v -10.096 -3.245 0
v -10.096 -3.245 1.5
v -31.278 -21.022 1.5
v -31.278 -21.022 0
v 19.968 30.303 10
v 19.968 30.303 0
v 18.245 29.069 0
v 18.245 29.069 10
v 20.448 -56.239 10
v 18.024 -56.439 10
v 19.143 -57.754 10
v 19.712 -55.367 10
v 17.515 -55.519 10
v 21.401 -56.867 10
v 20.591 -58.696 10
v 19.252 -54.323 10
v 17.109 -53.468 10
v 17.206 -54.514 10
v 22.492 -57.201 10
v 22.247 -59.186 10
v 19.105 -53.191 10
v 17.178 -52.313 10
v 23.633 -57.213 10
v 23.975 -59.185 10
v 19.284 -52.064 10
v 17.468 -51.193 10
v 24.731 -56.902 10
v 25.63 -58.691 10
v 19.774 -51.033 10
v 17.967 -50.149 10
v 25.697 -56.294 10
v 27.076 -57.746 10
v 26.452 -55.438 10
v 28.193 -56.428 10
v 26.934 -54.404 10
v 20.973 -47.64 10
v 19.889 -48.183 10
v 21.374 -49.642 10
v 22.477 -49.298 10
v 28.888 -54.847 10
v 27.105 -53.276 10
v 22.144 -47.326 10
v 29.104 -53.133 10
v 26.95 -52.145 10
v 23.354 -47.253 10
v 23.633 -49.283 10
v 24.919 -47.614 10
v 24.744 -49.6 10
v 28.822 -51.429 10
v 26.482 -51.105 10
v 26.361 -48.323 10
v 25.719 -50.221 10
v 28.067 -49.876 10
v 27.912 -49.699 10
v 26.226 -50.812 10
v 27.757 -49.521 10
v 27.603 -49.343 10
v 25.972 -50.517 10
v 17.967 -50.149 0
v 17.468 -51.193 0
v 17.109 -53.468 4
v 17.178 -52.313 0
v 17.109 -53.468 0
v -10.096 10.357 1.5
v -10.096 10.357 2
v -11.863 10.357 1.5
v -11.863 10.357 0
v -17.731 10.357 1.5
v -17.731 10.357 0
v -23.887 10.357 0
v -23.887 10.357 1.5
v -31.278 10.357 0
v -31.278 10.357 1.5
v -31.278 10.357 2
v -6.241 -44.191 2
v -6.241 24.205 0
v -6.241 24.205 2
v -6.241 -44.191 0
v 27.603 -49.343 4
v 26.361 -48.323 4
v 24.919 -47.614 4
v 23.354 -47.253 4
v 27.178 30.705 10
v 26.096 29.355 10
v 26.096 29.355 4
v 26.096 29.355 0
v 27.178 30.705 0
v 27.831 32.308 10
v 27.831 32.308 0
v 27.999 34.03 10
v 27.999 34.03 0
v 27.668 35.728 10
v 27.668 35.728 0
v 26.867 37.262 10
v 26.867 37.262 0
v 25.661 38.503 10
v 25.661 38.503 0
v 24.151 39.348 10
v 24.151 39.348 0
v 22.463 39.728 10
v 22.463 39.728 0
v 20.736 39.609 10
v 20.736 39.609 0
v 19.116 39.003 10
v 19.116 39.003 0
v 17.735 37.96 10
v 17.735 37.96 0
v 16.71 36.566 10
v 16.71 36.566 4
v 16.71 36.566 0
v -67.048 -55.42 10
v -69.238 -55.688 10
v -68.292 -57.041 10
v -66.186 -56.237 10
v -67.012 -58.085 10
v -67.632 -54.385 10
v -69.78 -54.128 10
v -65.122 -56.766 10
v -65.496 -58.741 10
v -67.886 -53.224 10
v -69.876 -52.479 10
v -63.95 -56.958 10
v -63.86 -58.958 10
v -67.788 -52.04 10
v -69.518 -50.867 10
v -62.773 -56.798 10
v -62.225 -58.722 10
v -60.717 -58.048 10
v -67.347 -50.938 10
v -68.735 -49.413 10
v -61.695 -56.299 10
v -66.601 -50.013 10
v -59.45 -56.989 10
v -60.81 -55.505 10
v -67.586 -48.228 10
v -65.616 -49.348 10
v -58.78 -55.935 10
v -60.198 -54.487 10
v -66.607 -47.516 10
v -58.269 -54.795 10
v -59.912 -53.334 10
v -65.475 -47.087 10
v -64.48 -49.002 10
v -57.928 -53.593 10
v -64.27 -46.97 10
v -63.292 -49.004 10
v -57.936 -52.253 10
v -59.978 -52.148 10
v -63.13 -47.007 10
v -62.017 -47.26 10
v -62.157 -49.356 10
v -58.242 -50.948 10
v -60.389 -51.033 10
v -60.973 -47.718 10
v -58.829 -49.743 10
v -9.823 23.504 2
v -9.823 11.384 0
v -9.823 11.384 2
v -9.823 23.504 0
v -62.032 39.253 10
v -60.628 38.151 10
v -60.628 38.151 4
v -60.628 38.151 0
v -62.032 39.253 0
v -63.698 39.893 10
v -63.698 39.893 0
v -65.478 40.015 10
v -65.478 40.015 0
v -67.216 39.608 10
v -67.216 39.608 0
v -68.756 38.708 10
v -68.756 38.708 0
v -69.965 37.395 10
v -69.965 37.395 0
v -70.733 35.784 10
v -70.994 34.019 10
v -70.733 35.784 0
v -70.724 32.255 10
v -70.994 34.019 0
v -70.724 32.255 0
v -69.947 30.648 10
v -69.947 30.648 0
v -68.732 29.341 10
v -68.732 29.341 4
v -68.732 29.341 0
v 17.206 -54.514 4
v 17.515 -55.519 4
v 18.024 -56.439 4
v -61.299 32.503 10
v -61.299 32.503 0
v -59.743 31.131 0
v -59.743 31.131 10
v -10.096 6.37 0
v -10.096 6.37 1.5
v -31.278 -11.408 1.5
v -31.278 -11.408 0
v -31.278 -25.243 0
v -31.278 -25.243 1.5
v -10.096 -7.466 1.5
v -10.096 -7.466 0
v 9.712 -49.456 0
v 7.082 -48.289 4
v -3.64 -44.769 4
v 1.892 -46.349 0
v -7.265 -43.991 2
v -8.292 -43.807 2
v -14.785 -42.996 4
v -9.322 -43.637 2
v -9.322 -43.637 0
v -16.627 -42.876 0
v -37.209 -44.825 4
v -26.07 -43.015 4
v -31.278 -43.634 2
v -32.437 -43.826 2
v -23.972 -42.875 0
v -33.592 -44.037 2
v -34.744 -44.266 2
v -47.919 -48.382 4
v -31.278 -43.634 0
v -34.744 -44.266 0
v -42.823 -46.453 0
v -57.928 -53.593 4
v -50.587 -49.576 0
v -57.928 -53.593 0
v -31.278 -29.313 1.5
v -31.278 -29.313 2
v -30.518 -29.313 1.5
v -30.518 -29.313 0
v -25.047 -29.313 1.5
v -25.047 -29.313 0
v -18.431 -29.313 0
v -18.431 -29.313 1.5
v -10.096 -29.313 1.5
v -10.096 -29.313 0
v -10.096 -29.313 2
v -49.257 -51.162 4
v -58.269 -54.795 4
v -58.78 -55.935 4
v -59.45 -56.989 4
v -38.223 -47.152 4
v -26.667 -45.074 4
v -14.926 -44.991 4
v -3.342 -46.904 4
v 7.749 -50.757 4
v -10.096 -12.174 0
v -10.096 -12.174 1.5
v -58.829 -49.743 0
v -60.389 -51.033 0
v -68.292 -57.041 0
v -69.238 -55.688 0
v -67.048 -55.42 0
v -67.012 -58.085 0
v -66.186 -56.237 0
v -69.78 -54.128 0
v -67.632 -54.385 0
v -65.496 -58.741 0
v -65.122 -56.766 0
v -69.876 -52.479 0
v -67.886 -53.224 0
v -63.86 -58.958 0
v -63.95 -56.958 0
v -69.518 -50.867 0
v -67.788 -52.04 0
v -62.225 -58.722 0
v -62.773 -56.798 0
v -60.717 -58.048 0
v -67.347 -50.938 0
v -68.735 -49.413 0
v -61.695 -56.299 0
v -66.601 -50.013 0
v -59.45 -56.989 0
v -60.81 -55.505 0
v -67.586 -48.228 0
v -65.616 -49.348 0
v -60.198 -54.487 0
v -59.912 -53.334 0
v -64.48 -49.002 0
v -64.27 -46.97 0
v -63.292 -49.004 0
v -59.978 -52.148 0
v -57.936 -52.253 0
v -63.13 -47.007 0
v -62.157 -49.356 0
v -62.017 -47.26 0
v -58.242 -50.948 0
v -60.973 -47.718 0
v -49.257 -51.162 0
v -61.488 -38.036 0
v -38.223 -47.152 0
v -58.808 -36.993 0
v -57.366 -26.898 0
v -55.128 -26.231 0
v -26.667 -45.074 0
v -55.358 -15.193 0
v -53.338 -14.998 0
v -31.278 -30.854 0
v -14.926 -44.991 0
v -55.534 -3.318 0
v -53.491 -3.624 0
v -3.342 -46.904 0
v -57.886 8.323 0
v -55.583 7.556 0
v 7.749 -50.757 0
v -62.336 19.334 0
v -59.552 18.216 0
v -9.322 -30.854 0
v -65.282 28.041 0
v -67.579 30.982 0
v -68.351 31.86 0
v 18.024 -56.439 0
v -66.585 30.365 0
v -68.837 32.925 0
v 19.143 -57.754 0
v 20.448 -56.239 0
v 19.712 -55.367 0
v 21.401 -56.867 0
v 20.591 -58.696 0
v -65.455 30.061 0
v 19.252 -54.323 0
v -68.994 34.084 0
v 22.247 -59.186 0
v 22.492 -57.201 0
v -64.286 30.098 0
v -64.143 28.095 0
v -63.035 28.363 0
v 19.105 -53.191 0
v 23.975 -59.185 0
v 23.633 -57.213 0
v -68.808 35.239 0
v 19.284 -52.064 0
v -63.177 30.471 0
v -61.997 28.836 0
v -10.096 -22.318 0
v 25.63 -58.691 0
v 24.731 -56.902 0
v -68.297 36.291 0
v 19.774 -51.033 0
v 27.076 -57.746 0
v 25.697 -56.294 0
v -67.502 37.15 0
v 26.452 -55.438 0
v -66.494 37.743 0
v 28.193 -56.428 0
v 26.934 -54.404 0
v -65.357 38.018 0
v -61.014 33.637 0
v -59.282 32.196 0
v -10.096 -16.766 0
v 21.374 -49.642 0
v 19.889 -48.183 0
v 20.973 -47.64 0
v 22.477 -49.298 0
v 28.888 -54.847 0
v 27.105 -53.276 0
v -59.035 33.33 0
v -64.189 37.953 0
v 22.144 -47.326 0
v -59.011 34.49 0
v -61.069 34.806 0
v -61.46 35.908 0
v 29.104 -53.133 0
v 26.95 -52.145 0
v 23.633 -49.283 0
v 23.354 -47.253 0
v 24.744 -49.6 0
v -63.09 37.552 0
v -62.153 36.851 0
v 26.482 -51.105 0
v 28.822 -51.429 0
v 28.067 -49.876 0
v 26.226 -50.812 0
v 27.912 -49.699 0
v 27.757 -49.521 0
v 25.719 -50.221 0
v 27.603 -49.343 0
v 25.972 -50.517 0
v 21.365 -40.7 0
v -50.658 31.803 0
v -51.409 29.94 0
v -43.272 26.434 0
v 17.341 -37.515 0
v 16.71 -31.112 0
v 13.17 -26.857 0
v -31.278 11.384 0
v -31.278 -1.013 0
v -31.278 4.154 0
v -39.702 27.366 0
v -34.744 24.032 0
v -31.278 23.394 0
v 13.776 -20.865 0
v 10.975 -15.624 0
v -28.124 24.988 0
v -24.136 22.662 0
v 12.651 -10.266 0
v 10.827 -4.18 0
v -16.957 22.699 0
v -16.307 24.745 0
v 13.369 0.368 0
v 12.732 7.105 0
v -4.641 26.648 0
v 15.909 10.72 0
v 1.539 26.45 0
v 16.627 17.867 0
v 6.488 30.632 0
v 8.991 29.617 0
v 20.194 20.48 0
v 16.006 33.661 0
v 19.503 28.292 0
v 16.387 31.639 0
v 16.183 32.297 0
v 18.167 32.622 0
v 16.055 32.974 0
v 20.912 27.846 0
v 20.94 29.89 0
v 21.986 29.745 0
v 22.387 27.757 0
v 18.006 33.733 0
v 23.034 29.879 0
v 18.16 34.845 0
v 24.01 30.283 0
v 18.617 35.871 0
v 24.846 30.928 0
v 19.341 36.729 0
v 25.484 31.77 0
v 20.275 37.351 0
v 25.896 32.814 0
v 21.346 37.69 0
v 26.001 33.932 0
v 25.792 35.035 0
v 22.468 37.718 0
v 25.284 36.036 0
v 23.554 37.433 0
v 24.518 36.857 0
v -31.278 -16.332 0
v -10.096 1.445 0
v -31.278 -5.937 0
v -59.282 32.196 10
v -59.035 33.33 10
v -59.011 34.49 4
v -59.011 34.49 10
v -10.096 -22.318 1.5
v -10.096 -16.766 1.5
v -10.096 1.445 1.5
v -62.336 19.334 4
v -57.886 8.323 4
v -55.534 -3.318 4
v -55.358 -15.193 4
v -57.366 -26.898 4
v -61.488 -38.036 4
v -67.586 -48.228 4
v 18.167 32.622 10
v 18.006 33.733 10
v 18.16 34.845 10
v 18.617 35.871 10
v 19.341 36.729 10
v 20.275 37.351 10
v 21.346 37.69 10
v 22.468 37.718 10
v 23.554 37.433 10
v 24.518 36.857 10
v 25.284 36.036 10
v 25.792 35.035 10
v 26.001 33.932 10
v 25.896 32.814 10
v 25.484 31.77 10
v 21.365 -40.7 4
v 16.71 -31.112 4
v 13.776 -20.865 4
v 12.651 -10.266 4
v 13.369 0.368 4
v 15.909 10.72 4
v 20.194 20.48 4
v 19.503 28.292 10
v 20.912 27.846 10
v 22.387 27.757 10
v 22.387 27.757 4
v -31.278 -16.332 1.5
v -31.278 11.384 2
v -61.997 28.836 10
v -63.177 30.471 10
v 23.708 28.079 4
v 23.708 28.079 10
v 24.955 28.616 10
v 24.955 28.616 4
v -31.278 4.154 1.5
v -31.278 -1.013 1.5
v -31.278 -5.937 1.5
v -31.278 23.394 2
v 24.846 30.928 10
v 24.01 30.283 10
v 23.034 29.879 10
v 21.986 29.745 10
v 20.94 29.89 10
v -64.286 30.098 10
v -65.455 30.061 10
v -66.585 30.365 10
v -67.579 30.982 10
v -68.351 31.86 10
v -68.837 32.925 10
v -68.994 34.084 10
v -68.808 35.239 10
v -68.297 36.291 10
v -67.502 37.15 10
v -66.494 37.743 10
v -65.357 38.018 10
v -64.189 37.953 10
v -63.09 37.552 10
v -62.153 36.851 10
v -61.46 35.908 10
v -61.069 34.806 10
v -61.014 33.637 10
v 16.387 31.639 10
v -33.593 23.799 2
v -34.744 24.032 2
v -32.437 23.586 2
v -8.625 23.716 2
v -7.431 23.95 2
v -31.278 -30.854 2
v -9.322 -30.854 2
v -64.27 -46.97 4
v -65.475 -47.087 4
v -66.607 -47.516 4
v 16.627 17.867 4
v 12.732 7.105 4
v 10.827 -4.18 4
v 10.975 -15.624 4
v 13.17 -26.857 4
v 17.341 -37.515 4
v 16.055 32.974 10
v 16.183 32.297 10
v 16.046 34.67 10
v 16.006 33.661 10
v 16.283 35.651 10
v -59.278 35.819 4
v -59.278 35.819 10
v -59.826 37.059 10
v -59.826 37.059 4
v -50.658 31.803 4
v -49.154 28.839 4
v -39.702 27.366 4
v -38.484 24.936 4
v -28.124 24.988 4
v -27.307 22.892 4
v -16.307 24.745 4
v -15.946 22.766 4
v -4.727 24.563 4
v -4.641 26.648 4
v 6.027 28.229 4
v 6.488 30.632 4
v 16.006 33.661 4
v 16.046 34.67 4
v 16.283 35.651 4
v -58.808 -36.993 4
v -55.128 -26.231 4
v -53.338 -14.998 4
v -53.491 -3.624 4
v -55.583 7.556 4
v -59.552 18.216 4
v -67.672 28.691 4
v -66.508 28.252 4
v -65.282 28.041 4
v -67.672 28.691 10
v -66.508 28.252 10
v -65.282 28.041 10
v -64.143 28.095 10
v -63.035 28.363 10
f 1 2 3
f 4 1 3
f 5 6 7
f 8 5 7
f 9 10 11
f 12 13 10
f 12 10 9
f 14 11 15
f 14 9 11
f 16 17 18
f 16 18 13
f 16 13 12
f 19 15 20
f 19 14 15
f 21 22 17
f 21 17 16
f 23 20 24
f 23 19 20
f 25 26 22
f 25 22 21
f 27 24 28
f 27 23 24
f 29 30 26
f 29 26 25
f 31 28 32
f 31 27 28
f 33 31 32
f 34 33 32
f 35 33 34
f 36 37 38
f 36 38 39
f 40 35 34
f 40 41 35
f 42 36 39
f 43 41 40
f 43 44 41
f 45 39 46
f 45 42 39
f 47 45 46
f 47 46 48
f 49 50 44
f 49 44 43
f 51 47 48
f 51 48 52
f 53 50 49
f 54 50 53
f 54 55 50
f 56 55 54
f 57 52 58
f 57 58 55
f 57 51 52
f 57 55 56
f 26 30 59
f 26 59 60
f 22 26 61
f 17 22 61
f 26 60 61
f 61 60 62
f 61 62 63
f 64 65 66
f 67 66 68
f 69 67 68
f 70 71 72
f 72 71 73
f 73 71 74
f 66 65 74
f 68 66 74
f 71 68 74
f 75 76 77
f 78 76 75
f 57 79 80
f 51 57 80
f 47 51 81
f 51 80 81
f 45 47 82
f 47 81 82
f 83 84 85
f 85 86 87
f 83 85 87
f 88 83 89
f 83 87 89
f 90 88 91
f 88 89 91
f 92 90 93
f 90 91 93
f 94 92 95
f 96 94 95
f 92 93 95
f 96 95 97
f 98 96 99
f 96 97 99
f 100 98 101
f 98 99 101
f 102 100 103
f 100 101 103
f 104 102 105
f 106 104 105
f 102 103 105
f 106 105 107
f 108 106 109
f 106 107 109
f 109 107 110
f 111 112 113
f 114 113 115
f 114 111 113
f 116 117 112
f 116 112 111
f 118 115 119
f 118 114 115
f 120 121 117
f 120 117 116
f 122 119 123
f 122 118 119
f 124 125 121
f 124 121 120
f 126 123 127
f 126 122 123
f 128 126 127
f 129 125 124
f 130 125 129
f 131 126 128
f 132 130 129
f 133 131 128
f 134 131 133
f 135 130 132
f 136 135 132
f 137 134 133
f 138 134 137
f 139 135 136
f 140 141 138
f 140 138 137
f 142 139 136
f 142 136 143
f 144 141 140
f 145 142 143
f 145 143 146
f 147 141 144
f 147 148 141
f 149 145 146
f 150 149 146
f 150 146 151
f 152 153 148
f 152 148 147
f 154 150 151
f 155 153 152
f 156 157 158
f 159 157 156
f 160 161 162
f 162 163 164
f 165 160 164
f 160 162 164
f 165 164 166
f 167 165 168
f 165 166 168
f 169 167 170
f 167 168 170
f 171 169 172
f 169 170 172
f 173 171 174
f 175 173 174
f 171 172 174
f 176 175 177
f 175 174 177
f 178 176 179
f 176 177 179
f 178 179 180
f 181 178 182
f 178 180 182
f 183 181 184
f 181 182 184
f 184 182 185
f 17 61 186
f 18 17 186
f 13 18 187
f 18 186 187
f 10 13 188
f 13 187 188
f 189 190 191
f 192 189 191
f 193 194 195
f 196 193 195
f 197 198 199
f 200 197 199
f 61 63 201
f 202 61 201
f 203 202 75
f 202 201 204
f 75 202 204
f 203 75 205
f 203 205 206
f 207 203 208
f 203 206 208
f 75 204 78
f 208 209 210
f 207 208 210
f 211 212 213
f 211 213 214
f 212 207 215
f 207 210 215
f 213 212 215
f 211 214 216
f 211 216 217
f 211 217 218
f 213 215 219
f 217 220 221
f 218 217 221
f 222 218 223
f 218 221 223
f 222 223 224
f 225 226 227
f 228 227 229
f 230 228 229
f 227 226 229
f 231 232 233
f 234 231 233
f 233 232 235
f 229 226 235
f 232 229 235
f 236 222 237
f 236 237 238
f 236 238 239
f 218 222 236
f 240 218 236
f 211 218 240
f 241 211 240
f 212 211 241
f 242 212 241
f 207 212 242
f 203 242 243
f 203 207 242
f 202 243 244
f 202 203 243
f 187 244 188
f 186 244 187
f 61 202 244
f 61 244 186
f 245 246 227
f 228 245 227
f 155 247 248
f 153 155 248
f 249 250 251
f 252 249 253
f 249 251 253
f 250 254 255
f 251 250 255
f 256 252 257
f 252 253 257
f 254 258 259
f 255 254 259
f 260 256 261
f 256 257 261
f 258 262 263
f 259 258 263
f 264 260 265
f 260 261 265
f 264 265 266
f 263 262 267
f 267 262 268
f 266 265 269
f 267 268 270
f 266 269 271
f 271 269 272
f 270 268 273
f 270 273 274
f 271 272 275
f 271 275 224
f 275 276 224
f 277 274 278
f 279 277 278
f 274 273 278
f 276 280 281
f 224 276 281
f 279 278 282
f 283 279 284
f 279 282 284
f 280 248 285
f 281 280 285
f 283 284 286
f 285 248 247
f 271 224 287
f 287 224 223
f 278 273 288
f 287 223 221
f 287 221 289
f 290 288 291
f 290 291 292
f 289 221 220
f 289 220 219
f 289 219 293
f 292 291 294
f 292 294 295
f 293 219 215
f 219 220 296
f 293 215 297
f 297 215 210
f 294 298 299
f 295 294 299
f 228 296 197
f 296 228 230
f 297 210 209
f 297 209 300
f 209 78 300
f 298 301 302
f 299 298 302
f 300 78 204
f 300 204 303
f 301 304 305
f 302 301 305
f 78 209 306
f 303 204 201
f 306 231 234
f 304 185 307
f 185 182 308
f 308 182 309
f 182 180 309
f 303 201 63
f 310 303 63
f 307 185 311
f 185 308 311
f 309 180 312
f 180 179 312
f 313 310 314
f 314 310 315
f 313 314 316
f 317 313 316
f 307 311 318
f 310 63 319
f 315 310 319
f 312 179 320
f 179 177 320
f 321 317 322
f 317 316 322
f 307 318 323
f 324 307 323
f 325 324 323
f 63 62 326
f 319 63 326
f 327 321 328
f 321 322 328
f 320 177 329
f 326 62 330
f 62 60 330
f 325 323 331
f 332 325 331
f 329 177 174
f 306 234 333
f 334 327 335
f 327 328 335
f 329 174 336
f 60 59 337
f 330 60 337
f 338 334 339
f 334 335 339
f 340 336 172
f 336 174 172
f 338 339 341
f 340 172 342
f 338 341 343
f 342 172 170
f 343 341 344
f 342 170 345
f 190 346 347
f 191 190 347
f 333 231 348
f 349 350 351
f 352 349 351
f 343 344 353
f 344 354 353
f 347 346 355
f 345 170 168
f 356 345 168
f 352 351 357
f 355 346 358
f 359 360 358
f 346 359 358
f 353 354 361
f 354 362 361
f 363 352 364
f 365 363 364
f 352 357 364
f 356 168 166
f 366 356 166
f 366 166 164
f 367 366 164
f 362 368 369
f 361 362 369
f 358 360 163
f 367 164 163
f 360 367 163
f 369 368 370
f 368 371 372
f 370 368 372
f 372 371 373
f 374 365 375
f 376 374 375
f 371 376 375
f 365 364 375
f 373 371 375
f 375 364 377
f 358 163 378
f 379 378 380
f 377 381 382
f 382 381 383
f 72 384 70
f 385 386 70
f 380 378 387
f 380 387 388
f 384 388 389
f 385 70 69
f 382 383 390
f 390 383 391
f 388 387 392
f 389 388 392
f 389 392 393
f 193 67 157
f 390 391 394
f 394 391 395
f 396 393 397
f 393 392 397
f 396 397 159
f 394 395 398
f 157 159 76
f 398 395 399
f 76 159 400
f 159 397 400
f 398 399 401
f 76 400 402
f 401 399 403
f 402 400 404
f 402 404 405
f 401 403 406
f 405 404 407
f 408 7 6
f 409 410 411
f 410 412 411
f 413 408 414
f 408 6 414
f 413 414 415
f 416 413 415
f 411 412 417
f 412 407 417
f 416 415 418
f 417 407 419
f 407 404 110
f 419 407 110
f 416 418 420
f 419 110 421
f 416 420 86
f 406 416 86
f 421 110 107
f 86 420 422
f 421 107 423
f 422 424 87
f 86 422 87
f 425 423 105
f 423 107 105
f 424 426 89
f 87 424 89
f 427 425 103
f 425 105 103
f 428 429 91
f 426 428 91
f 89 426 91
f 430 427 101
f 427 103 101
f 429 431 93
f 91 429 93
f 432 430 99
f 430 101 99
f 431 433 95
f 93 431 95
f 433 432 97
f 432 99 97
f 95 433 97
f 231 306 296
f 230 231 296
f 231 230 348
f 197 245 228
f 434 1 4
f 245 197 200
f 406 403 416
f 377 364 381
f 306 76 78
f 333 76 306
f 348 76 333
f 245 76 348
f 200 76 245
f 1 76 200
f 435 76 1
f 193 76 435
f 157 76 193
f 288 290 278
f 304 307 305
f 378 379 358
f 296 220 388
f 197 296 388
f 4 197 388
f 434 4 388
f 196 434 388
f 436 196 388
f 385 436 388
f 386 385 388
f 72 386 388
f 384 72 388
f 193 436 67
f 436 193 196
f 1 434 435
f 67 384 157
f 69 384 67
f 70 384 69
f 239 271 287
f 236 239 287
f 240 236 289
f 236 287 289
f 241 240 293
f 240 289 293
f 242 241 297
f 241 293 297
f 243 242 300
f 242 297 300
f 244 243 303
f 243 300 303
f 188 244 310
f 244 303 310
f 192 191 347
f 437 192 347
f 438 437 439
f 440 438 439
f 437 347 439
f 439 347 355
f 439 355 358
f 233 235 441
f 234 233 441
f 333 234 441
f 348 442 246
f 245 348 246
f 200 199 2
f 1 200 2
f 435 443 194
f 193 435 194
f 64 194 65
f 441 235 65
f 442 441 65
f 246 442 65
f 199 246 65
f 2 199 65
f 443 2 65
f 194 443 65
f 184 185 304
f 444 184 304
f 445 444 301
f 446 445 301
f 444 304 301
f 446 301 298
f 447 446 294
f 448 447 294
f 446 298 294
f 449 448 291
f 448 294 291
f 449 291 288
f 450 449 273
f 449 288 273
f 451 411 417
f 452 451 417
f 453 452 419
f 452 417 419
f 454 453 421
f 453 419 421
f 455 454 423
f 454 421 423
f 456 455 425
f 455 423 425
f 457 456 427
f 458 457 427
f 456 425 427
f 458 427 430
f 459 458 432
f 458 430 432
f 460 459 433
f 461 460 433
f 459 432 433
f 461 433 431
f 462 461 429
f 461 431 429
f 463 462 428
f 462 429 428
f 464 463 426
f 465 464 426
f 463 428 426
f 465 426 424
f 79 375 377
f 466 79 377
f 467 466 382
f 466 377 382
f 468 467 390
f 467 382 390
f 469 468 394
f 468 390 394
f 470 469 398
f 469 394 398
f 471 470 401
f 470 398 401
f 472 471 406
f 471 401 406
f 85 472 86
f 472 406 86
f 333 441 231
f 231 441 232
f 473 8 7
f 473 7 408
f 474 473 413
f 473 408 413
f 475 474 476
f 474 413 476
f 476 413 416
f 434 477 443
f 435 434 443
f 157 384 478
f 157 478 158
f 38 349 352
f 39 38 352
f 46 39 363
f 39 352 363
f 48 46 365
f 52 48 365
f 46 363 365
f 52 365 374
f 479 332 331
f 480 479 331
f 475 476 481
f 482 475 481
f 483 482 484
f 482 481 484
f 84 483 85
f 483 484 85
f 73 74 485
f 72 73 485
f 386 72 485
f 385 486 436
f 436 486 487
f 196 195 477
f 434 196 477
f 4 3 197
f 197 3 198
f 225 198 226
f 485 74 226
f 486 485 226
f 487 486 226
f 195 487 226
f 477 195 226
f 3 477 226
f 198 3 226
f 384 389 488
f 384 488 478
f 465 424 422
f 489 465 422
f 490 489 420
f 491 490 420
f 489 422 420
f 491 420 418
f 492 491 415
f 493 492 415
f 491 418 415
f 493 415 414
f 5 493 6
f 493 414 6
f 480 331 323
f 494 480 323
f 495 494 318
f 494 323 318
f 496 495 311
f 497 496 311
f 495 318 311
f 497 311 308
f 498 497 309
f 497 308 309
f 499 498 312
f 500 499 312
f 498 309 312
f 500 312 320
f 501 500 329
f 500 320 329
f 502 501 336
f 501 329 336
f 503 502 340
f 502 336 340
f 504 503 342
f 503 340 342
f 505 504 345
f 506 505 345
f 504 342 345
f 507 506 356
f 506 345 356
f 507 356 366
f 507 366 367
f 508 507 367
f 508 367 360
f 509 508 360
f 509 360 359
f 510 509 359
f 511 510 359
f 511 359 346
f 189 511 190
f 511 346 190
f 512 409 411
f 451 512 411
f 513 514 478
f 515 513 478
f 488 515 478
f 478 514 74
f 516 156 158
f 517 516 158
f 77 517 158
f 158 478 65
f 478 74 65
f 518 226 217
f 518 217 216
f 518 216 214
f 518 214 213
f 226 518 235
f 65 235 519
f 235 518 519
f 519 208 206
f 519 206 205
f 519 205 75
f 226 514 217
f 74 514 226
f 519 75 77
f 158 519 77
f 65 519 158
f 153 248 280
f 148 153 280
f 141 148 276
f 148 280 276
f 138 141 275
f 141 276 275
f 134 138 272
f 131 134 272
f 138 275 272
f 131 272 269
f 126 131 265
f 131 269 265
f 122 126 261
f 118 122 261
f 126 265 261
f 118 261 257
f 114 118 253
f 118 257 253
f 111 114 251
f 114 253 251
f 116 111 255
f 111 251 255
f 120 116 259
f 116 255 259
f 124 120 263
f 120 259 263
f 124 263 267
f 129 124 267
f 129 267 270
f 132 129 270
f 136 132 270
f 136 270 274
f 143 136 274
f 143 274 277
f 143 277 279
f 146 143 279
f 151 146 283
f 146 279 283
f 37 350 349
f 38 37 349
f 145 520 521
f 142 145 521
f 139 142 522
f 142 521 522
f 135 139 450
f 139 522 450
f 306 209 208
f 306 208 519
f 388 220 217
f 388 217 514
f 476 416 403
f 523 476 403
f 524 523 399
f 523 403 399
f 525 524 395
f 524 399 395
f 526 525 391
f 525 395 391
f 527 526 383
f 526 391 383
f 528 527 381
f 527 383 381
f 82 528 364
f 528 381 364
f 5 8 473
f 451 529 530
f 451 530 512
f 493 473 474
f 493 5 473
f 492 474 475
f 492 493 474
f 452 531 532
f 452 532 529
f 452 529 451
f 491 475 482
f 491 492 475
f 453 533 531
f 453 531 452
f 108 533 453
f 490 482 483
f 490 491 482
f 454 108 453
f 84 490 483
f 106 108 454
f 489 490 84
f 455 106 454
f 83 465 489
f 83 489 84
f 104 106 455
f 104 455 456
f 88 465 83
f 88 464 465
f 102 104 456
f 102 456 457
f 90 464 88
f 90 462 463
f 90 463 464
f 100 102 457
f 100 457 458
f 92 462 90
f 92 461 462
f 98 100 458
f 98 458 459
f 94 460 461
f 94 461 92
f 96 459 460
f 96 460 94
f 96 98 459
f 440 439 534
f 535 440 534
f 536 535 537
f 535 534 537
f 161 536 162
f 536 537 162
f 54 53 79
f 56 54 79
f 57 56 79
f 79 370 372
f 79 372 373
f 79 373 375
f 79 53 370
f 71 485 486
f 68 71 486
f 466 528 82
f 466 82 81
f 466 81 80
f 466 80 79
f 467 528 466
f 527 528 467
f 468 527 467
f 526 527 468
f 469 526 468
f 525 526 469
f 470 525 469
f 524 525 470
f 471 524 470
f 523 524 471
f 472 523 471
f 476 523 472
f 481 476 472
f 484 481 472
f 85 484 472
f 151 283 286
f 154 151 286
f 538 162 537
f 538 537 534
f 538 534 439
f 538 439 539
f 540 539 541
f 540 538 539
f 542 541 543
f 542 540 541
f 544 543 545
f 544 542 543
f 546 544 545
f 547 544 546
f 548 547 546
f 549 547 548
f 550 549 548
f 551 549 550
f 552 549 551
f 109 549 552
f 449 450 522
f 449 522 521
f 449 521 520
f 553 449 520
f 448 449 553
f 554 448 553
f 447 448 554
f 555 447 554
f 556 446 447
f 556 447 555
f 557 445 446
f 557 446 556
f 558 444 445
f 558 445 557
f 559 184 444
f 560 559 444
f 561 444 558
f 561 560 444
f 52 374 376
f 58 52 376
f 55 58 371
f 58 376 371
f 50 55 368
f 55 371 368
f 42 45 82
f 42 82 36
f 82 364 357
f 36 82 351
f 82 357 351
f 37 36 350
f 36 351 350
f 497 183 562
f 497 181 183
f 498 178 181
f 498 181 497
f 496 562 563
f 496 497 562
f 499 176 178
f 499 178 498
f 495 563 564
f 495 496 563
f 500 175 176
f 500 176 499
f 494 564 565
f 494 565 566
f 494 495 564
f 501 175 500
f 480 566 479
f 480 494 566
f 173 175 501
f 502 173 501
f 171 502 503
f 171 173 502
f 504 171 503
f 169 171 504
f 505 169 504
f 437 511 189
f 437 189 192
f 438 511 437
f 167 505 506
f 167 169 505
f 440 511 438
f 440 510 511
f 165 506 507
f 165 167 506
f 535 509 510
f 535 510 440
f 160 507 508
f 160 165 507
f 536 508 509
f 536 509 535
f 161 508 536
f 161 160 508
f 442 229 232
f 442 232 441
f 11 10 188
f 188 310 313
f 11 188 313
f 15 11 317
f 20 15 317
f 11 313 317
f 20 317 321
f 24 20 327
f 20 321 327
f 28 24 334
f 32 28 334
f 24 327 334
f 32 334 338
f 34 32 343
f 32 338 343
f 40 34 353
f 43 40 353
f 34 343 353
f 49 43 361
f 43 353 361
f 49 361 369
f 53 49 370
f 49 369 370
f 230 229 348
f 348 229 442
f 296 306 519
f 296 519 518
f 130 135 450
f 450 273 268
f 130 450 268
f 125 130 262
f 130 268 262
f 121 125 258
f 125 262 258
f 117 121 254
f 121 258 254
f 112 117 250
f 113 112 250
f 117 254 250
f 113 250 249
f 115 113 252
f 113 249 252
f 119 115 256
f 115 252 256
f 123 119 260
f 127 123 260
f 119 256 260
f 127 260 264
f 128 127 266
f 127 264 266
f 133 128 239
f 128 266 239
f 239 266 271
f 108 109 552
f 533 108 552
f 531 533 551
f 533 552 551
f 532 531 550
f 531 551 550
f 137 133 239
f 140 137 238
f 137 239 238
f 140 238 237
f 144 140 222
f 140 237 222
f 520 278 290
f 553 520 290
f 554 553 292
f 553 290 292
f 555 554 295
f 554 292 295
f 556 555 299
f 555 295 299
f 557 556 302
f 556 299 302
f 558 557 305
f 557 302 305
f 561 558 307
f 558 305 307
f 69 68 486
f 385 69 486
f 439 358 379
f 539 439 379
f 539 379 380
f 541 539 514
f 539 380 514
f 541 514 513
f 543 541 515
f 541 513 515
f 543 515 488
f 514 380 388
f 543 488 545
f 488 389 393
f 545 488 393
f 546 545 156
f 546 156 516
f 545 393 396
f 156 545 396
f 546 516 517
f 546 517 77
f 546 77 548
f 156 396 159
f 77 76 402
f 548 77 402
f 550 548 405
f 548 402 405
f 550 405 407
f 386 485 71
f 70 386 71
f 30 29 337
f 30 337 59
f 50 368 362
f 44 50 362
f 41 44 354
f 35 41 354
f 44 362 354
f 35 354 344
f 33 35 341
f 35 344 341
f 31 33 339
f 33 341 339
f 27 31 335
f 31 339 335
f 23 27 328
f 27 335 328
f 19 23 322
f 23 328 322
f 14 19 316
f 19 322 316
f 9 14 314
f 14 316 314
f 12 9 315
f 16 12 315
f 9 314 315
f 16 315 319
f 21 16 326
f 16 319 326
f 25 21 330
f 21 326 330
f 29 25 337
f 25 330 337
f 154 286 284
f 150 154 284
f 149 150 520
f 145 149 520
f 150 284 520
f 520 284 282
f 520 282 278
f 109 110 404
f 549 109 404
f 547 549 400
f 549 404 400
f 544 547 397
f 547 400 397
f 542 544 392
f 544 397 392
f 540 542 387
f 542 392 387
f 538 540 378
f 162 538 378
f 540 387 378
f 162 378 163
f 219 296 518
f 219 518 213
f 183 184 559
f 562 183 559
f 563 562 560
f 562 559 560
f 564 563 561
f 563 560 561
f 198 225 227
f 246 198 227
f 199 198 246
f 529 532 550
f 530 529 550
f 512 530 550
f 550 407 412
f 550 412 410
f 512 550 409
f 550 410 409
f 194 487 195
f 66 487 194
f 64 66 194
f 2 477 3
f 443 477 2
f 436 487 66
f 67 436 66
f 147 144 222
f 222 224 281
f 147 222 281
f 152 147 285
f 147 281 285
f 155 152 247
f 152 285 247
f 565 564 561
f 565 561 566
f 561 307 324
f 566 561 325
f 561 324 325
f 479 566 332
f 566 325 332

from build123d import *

# Parameters (mm, degrees)
F1_DEPTH = 10
F2_DEPTH = 4
F4_DEPTH = 2
F5_W     = 21.1815265939
F5_H     = 39.6702438593
F6_DEPTH = 0.5
F8_DEPTH = 1.501


with BuildPart() as f1:
    # F0 (on Top) → F1 (new body)
    with BuildSketch(Plane.XY):
        with BuildLine():
            Line((-62.1572475363, -49.3555771993), (-60.9726684437, -47.7181399205))
            ThreePointArc((-60.9726684437, -47.7181399205), (-62.5677534438, -47.1070816307), (-64.2703892861, -46.970262115))
            ThreePointArc((-64.2703892861, -46.970262115), (-66.055157525, -47.2638248655), (-67.5855421771, -48.2279304467))
            ThreePointArc((-67.5855421771, -48.2279304467), (-68.2915955562, -57.0411338211), (-59.4503077741, -56.9892161196))
            ThreePointArc((-59.4503077741, -56.9892161196), (-58.503657354, -55.3744867929), (-57.9284491894, -53.593298037))
            ThreePointArc((-57.9284491894, -53.593298037), (-58.0525320787, -51.5916655896), (-58.8293116163, -49.7427354752))
            Line((-58.8293116163, -49.7427354752), (-60.3885015243, -51.0333806943))
            ThreePointArc((-60.3885015243, -51.0333806943), (-66.6476098165, -55.8605427209), (-62.1572475363, -49.3555771993))
        make_face()
    extrude(amount=F1_DEPTH)



with BuildPart() as f1b:
    # F0 (on Top) → F1, piece 2 (new body)
    with BuildSketch(Plane.XY):
        with BuildLine():
            ThreePointArc((17.1087630149, -53.4675772739), (17.3345654758, -55.024615232), (18.0236412267, -56.4390156575))
            ThreePointArc((18.0236412267, -56.4390156575), (26.3870023747, -58.2706581148), (28.0672567096, -49.8755721025))
            ThreePointArc((28.0672567096, -49.8755721025), (27.8342119425, -49.6100285483), (27.6026930798, -49.343153561))
            ThreePointArc((27.6026930798, -49.343153561), (25.6605798387, -47.9272938937), (23.3536224131, -47.2531945869))
            ThreePointArc((23.3536224131, -47.2531945869), (21.5502161664, -47.4529085878), (19.8889698394, -48.1825800302))
            Line((19.8889698394, -48.1825800302), (21.3739898723, -49.6418572585))
            ThreePointArc((21.3739898723, -49.6418572585), (23.6329189205, -49.2830550049), (25.7191516005, -50.2206757743))
            ThreePointArc((25.7191516005, -50.2206757743), (26.0985339145, -50.66438117), (26.4819704741, -51.1045877386))
            ThreePointArc((26.4819704741, -51.1045877386), (23.0622875716, -57.2478053636), (19.7737803157, -51.0333806943))
            Line((19.7737803157, -51.0333806943), (17.9670109528, -50.1490486996))
            ThreePointArc((17.9670109528, -50.1490486996), (17.2958667801, -51.7457209867), (17.1087630149, -53.4675772739))
        make_face()
    extrude(amount=F1_DEPTH)


with BuildPart() as f1c:
    # F0 (on Top) → F1, piece 3 (new body)
    with BuildSketch(Plane.XY):
        with BuildLine():
            ThreePointArc((26.0956428667, 29.3550487731), (25.6609988664, 38.5030065298), (16.7099807908, 36.5656573261))
            ThreePointArc((16.7099807908, 36.5656573261), (16.1402416091, 35.1660163707), (16.0062342849, 33.6608122064))
            ThreePointArc((16.0062342849, 33.6608122064), (16.109517209, 32.6334069675), (16.3874284639, 31.6389250815))
            Line((16.3874284639, 31.6389250815), (18.1665952148, 32.6217676343))
            ThreePointArc((18.1665952148, 32.6217676343), (22.4683173599, 37.7181778333), (25.4838572425, 31.7696713362))
            ThreePointArc((25.4838572425, 31.7696713362), (23.0337650915, 29.879413145), (19.9683402486, 30.3027311227))
            Line((19.9683402486, 30.3027311227), (18.2454213302, 29.0694802814))
            ThreePointArc((18.2454213302, 29.0694802814), (20.1934444417, 28.0252417902), (22.3873843451, 27.7571825242))
            ThreePointArc((22.3873843451, 27.7571825242), (24.3427437086, 28.3211852273), (26.0956428667, 29.3550487731))
        make_face()
    extrude(amount=F1_DEPTH)


with BuildPart() as f1d:
    # F0 (on Top) → F1, piece 4 (new body)
    with BuildSketch(Plane.XY):
        with BuildLine():
            ThreePointArc((-68.732125287, 29.3414321402), (-67.1003065349, 28.443679964), (-65.2817843614, 28.0414753968))
            ThreePointArc((-65.2817843614, 28.0414753968), (-63.5823726874, 28.2029549498), (-61.9972172476, 28.8364830984))
            Line((-61.9972172476, 28.8364830984), (-63.1768257939, 30.471091811))
            ThreePointArc((-63.1768257939, 30.471091811), (-67.9311262024, 36.7498087051), (-61.2988677278, 32.5025971803))
            Line((-61.2988677278, 32.5025971803), (-59.7430924035, 31.1312410763))
            ThreePointArc((-59.7430924035, 31.1312410763), (-59.1314611672, 32.7570252654), (-59.0111762545, 34.4898837532))
            ThreePointArc((-59.0111762545, 34.4898837532), (-59.5181526175, 36.4535488342), (-60.6284022775, 38.1507086015))
            ThreePointArc((-60.6284022775, 38.1507086015), (-69.4096636596, 38.09668268), (-68.732125287, 29.3414321402))
        make_face()
    extrude(amount=F1_DEPTH)


with BuildPart() as f1_1:
    add(f1.part)

    add(f1b.part)  # F2 merges F1b

    add(f1c.part)  # F2 merges F1c

    add(f1d.part)  # F2 merges F1d
    # F0 (on Top) → F2 (join)
    with BuildSketch(Plane.XY):
        with BuildLine():
            ThreePointArc((-67.5855421771, -48.2279304467), (-66.055157525, -47.2638248655), (-64.2703892861, -46.970262115))
            ThreePointArc((-64.2703892861, -46.970262115), (-53.1706504597, -9.3079154321), (-65.2817843614, 28.0414753968))
            ThreePointArc((-65.2817843614, 28.0414753968), (-67.1003065349, 28.443679964), (-68.732125287, 29.3414321402))
            ThreePointArc((-68.732125287, 29.3414321402), (-55.1716501295, -9.251280509), (-67.5855421771, -48.2279304467))
        make_face()
        with BuildLine():
            ThreePointArc((16.7099807908, 36.5656573261), (-22.2207470412, 24.5972113145), (-60.6284022775, 38.1507086015))
            ThreePointArc((-60.6284022775, 38.1507086015), (-59.5181526175, 36.4535488342), (-59.0111762545, 34.4898837532))
            ThreePointArc((-59.0111762545, 34.4898837532), (-21.6294297382, 22.5876579696), (16.0062342849, 33.6608122064))
            ThreePointArc((16.0062342849, 33.6608122064), (16.1402416091, 35.1660163707), (16.7099807908, 36.5656573261))
        make_face()
        with BuildLine():
            ThreePointArc((27.6026930798, -49.343153561), (12.6512102924, -10.2659396101), (26.0956428667, 29.3550487731))
            ThreePointArc((26.0956428667, 29.3550487731), (24.3427437086, 28.3211852273), (22.3873843451, 27.7571825242))
            ThreePointArc((22.3873843451, 27.7571825242), (10.6432367974, -9.9055102447), (23.3536224131, -47.2531945869))
            ThreePointArc((23.3536224131, -47.2531945869), (25.6605798387, -47.9272938937), (27.6026930798, -49.343153561))
        make_face()
        with BuildLine():
            ThreePointArc((-57.9284491894, -53.593298037), (-58.503657354, -55.3744867929), (-59.4503077741, -56.9892161196))
            ThreePointArc((-59.4503077741, -56.9892161196), (-20.798072436, -44.7819602715), (18.0236412267, -56.4390156575))
            ThreePointArc((18.0236412267, -56.4390156575), (17.3345654758, -55.024615232), (17.1087630149, -53.4675772739))
            ThreePointArc((17.1087630149, -53.4675772739), (-20.4278543179, -42.780323647), (-57.9284491894, -53.593298037))
        make_face()
    extrude(amount=F2_DEPTH)

    # F3 (on face) → F4 (join)
    with BuildSketch(Plane(origin=(0, 0, 0), x_dir=(1, 0, 0), z_dir=(0, 0, -1))):
        with BuildLine():
            Line((-9.3221692368, 30.8540649712), (-31.277757138, 30.8540649712))
            Line((-31.277757138, 30.8540649712), (-31.277757138, 43.6344668102))
            ThreePointArc((-31.277757138, 43.6344668102), (-33.0149879746, 43.9288902719), (-34.7443595529, 44.266425601))
            Line((-34.7443595529, 44.266425601), (-34.7443595529, 30.8540649712))
            Line((-34.7443595529, 30.8540649712), (-34.7443595529, -11.383831501))
            Line((-34.7443595529, -11.383831501), (-34.7443595529, -24.0321703309))
            ThreePointArc((-34.7443595529, -24.0321703309), (-33.0152564459, -23.6903099606), (-31.277757138, -23.3940630665))
            Line((-31.277757138, -23.3940630665), (-31.277757138, -11.383831501))
            Line((-31.277757138, -11.383831501), (-9.8225176334, -11.383831501))
            Line((-9.8225176334, -11.383831501), (-9.8225176334, -23.5040877089))
            ThreePointArc((-9.8225176334, -23.5040877089), (-8.027086971, -23.8300565225), (-6.2412018888, -24.2048116485))
            Line((-6.2412018888, -24.2048116485), (-6.2412018888, -11.383831501))
            Line((-6.2412018888, -11.383831501), (-6.2412018888, 30.8540649712))
            Line((-6.2412018888, 30.8540649712), (-6.2412018888, 44.1910067814))
            ThreePointArc((-6.2412018888, 44.1910067814), (-7.7786273027, 43.8971600473), (-9.3221692368, 43.6373503013))
            Line((-9.3221692368, 43.6373503013), (-9.3221692368, 30.8540649712))
        make_face()
    extrude(amount=-F4_DEPTH)

    # F5 (on face) → F6 (cut)
    with BuildSketch(Plane.XY.offset(2)):
        with Locations((-20.6869938411, -9.4783511013)):
            Rectangle(F5_W, F5_H)
    extrude(amount=-F6_DEPTH, mode=Mode.SUBTRACT)

    # F7 (on face) → F8 (cut, through all)
    with BuildSketch(Plane.XY.offset(1.5)):
        Polygon((-31.277757138, 10.3567708284), (-31.277757138, 4.1535533965), (-23.8866638392, 10.3567708284), align=None)
        Polygon((-17.7311521972, 10.3567708284), (-31.277757138, -1.0126616107), (-31.277757138, -5.9374999255), (-11.8632393173, 10.3567708284), align=None)
        Polygon((-10.0962305441, 6.3696975482), (-31.277757138, -11.4075932652), (-31.277757138, -16.3320098072), (-10.0962305441, 1.4452810061), align=None)
        Polygon((-10.0962305441, -3.244678803), (-31.277757138, -21.0219696164), (-31.277757138, -25.2428706735), (-10.0962305441, -7.4655798602), align=None)
        Polygon((-10.0962305441, -16.7659351889), (-10.0962305441, -12.173710581), (-30.5181462318, -29.3134730309), (-25.0465404242, -29.3134730309), align=None)
        Polygon((-10.0962305441, -29.3134730309), (-10.0962305441, -22.3181112129), (-18.4311587363, -29.3134730309), align=None)
    extrude(amount=-F8_DEPTH, mode=Mode.SUBTRACT)


solid = f1_1.part
